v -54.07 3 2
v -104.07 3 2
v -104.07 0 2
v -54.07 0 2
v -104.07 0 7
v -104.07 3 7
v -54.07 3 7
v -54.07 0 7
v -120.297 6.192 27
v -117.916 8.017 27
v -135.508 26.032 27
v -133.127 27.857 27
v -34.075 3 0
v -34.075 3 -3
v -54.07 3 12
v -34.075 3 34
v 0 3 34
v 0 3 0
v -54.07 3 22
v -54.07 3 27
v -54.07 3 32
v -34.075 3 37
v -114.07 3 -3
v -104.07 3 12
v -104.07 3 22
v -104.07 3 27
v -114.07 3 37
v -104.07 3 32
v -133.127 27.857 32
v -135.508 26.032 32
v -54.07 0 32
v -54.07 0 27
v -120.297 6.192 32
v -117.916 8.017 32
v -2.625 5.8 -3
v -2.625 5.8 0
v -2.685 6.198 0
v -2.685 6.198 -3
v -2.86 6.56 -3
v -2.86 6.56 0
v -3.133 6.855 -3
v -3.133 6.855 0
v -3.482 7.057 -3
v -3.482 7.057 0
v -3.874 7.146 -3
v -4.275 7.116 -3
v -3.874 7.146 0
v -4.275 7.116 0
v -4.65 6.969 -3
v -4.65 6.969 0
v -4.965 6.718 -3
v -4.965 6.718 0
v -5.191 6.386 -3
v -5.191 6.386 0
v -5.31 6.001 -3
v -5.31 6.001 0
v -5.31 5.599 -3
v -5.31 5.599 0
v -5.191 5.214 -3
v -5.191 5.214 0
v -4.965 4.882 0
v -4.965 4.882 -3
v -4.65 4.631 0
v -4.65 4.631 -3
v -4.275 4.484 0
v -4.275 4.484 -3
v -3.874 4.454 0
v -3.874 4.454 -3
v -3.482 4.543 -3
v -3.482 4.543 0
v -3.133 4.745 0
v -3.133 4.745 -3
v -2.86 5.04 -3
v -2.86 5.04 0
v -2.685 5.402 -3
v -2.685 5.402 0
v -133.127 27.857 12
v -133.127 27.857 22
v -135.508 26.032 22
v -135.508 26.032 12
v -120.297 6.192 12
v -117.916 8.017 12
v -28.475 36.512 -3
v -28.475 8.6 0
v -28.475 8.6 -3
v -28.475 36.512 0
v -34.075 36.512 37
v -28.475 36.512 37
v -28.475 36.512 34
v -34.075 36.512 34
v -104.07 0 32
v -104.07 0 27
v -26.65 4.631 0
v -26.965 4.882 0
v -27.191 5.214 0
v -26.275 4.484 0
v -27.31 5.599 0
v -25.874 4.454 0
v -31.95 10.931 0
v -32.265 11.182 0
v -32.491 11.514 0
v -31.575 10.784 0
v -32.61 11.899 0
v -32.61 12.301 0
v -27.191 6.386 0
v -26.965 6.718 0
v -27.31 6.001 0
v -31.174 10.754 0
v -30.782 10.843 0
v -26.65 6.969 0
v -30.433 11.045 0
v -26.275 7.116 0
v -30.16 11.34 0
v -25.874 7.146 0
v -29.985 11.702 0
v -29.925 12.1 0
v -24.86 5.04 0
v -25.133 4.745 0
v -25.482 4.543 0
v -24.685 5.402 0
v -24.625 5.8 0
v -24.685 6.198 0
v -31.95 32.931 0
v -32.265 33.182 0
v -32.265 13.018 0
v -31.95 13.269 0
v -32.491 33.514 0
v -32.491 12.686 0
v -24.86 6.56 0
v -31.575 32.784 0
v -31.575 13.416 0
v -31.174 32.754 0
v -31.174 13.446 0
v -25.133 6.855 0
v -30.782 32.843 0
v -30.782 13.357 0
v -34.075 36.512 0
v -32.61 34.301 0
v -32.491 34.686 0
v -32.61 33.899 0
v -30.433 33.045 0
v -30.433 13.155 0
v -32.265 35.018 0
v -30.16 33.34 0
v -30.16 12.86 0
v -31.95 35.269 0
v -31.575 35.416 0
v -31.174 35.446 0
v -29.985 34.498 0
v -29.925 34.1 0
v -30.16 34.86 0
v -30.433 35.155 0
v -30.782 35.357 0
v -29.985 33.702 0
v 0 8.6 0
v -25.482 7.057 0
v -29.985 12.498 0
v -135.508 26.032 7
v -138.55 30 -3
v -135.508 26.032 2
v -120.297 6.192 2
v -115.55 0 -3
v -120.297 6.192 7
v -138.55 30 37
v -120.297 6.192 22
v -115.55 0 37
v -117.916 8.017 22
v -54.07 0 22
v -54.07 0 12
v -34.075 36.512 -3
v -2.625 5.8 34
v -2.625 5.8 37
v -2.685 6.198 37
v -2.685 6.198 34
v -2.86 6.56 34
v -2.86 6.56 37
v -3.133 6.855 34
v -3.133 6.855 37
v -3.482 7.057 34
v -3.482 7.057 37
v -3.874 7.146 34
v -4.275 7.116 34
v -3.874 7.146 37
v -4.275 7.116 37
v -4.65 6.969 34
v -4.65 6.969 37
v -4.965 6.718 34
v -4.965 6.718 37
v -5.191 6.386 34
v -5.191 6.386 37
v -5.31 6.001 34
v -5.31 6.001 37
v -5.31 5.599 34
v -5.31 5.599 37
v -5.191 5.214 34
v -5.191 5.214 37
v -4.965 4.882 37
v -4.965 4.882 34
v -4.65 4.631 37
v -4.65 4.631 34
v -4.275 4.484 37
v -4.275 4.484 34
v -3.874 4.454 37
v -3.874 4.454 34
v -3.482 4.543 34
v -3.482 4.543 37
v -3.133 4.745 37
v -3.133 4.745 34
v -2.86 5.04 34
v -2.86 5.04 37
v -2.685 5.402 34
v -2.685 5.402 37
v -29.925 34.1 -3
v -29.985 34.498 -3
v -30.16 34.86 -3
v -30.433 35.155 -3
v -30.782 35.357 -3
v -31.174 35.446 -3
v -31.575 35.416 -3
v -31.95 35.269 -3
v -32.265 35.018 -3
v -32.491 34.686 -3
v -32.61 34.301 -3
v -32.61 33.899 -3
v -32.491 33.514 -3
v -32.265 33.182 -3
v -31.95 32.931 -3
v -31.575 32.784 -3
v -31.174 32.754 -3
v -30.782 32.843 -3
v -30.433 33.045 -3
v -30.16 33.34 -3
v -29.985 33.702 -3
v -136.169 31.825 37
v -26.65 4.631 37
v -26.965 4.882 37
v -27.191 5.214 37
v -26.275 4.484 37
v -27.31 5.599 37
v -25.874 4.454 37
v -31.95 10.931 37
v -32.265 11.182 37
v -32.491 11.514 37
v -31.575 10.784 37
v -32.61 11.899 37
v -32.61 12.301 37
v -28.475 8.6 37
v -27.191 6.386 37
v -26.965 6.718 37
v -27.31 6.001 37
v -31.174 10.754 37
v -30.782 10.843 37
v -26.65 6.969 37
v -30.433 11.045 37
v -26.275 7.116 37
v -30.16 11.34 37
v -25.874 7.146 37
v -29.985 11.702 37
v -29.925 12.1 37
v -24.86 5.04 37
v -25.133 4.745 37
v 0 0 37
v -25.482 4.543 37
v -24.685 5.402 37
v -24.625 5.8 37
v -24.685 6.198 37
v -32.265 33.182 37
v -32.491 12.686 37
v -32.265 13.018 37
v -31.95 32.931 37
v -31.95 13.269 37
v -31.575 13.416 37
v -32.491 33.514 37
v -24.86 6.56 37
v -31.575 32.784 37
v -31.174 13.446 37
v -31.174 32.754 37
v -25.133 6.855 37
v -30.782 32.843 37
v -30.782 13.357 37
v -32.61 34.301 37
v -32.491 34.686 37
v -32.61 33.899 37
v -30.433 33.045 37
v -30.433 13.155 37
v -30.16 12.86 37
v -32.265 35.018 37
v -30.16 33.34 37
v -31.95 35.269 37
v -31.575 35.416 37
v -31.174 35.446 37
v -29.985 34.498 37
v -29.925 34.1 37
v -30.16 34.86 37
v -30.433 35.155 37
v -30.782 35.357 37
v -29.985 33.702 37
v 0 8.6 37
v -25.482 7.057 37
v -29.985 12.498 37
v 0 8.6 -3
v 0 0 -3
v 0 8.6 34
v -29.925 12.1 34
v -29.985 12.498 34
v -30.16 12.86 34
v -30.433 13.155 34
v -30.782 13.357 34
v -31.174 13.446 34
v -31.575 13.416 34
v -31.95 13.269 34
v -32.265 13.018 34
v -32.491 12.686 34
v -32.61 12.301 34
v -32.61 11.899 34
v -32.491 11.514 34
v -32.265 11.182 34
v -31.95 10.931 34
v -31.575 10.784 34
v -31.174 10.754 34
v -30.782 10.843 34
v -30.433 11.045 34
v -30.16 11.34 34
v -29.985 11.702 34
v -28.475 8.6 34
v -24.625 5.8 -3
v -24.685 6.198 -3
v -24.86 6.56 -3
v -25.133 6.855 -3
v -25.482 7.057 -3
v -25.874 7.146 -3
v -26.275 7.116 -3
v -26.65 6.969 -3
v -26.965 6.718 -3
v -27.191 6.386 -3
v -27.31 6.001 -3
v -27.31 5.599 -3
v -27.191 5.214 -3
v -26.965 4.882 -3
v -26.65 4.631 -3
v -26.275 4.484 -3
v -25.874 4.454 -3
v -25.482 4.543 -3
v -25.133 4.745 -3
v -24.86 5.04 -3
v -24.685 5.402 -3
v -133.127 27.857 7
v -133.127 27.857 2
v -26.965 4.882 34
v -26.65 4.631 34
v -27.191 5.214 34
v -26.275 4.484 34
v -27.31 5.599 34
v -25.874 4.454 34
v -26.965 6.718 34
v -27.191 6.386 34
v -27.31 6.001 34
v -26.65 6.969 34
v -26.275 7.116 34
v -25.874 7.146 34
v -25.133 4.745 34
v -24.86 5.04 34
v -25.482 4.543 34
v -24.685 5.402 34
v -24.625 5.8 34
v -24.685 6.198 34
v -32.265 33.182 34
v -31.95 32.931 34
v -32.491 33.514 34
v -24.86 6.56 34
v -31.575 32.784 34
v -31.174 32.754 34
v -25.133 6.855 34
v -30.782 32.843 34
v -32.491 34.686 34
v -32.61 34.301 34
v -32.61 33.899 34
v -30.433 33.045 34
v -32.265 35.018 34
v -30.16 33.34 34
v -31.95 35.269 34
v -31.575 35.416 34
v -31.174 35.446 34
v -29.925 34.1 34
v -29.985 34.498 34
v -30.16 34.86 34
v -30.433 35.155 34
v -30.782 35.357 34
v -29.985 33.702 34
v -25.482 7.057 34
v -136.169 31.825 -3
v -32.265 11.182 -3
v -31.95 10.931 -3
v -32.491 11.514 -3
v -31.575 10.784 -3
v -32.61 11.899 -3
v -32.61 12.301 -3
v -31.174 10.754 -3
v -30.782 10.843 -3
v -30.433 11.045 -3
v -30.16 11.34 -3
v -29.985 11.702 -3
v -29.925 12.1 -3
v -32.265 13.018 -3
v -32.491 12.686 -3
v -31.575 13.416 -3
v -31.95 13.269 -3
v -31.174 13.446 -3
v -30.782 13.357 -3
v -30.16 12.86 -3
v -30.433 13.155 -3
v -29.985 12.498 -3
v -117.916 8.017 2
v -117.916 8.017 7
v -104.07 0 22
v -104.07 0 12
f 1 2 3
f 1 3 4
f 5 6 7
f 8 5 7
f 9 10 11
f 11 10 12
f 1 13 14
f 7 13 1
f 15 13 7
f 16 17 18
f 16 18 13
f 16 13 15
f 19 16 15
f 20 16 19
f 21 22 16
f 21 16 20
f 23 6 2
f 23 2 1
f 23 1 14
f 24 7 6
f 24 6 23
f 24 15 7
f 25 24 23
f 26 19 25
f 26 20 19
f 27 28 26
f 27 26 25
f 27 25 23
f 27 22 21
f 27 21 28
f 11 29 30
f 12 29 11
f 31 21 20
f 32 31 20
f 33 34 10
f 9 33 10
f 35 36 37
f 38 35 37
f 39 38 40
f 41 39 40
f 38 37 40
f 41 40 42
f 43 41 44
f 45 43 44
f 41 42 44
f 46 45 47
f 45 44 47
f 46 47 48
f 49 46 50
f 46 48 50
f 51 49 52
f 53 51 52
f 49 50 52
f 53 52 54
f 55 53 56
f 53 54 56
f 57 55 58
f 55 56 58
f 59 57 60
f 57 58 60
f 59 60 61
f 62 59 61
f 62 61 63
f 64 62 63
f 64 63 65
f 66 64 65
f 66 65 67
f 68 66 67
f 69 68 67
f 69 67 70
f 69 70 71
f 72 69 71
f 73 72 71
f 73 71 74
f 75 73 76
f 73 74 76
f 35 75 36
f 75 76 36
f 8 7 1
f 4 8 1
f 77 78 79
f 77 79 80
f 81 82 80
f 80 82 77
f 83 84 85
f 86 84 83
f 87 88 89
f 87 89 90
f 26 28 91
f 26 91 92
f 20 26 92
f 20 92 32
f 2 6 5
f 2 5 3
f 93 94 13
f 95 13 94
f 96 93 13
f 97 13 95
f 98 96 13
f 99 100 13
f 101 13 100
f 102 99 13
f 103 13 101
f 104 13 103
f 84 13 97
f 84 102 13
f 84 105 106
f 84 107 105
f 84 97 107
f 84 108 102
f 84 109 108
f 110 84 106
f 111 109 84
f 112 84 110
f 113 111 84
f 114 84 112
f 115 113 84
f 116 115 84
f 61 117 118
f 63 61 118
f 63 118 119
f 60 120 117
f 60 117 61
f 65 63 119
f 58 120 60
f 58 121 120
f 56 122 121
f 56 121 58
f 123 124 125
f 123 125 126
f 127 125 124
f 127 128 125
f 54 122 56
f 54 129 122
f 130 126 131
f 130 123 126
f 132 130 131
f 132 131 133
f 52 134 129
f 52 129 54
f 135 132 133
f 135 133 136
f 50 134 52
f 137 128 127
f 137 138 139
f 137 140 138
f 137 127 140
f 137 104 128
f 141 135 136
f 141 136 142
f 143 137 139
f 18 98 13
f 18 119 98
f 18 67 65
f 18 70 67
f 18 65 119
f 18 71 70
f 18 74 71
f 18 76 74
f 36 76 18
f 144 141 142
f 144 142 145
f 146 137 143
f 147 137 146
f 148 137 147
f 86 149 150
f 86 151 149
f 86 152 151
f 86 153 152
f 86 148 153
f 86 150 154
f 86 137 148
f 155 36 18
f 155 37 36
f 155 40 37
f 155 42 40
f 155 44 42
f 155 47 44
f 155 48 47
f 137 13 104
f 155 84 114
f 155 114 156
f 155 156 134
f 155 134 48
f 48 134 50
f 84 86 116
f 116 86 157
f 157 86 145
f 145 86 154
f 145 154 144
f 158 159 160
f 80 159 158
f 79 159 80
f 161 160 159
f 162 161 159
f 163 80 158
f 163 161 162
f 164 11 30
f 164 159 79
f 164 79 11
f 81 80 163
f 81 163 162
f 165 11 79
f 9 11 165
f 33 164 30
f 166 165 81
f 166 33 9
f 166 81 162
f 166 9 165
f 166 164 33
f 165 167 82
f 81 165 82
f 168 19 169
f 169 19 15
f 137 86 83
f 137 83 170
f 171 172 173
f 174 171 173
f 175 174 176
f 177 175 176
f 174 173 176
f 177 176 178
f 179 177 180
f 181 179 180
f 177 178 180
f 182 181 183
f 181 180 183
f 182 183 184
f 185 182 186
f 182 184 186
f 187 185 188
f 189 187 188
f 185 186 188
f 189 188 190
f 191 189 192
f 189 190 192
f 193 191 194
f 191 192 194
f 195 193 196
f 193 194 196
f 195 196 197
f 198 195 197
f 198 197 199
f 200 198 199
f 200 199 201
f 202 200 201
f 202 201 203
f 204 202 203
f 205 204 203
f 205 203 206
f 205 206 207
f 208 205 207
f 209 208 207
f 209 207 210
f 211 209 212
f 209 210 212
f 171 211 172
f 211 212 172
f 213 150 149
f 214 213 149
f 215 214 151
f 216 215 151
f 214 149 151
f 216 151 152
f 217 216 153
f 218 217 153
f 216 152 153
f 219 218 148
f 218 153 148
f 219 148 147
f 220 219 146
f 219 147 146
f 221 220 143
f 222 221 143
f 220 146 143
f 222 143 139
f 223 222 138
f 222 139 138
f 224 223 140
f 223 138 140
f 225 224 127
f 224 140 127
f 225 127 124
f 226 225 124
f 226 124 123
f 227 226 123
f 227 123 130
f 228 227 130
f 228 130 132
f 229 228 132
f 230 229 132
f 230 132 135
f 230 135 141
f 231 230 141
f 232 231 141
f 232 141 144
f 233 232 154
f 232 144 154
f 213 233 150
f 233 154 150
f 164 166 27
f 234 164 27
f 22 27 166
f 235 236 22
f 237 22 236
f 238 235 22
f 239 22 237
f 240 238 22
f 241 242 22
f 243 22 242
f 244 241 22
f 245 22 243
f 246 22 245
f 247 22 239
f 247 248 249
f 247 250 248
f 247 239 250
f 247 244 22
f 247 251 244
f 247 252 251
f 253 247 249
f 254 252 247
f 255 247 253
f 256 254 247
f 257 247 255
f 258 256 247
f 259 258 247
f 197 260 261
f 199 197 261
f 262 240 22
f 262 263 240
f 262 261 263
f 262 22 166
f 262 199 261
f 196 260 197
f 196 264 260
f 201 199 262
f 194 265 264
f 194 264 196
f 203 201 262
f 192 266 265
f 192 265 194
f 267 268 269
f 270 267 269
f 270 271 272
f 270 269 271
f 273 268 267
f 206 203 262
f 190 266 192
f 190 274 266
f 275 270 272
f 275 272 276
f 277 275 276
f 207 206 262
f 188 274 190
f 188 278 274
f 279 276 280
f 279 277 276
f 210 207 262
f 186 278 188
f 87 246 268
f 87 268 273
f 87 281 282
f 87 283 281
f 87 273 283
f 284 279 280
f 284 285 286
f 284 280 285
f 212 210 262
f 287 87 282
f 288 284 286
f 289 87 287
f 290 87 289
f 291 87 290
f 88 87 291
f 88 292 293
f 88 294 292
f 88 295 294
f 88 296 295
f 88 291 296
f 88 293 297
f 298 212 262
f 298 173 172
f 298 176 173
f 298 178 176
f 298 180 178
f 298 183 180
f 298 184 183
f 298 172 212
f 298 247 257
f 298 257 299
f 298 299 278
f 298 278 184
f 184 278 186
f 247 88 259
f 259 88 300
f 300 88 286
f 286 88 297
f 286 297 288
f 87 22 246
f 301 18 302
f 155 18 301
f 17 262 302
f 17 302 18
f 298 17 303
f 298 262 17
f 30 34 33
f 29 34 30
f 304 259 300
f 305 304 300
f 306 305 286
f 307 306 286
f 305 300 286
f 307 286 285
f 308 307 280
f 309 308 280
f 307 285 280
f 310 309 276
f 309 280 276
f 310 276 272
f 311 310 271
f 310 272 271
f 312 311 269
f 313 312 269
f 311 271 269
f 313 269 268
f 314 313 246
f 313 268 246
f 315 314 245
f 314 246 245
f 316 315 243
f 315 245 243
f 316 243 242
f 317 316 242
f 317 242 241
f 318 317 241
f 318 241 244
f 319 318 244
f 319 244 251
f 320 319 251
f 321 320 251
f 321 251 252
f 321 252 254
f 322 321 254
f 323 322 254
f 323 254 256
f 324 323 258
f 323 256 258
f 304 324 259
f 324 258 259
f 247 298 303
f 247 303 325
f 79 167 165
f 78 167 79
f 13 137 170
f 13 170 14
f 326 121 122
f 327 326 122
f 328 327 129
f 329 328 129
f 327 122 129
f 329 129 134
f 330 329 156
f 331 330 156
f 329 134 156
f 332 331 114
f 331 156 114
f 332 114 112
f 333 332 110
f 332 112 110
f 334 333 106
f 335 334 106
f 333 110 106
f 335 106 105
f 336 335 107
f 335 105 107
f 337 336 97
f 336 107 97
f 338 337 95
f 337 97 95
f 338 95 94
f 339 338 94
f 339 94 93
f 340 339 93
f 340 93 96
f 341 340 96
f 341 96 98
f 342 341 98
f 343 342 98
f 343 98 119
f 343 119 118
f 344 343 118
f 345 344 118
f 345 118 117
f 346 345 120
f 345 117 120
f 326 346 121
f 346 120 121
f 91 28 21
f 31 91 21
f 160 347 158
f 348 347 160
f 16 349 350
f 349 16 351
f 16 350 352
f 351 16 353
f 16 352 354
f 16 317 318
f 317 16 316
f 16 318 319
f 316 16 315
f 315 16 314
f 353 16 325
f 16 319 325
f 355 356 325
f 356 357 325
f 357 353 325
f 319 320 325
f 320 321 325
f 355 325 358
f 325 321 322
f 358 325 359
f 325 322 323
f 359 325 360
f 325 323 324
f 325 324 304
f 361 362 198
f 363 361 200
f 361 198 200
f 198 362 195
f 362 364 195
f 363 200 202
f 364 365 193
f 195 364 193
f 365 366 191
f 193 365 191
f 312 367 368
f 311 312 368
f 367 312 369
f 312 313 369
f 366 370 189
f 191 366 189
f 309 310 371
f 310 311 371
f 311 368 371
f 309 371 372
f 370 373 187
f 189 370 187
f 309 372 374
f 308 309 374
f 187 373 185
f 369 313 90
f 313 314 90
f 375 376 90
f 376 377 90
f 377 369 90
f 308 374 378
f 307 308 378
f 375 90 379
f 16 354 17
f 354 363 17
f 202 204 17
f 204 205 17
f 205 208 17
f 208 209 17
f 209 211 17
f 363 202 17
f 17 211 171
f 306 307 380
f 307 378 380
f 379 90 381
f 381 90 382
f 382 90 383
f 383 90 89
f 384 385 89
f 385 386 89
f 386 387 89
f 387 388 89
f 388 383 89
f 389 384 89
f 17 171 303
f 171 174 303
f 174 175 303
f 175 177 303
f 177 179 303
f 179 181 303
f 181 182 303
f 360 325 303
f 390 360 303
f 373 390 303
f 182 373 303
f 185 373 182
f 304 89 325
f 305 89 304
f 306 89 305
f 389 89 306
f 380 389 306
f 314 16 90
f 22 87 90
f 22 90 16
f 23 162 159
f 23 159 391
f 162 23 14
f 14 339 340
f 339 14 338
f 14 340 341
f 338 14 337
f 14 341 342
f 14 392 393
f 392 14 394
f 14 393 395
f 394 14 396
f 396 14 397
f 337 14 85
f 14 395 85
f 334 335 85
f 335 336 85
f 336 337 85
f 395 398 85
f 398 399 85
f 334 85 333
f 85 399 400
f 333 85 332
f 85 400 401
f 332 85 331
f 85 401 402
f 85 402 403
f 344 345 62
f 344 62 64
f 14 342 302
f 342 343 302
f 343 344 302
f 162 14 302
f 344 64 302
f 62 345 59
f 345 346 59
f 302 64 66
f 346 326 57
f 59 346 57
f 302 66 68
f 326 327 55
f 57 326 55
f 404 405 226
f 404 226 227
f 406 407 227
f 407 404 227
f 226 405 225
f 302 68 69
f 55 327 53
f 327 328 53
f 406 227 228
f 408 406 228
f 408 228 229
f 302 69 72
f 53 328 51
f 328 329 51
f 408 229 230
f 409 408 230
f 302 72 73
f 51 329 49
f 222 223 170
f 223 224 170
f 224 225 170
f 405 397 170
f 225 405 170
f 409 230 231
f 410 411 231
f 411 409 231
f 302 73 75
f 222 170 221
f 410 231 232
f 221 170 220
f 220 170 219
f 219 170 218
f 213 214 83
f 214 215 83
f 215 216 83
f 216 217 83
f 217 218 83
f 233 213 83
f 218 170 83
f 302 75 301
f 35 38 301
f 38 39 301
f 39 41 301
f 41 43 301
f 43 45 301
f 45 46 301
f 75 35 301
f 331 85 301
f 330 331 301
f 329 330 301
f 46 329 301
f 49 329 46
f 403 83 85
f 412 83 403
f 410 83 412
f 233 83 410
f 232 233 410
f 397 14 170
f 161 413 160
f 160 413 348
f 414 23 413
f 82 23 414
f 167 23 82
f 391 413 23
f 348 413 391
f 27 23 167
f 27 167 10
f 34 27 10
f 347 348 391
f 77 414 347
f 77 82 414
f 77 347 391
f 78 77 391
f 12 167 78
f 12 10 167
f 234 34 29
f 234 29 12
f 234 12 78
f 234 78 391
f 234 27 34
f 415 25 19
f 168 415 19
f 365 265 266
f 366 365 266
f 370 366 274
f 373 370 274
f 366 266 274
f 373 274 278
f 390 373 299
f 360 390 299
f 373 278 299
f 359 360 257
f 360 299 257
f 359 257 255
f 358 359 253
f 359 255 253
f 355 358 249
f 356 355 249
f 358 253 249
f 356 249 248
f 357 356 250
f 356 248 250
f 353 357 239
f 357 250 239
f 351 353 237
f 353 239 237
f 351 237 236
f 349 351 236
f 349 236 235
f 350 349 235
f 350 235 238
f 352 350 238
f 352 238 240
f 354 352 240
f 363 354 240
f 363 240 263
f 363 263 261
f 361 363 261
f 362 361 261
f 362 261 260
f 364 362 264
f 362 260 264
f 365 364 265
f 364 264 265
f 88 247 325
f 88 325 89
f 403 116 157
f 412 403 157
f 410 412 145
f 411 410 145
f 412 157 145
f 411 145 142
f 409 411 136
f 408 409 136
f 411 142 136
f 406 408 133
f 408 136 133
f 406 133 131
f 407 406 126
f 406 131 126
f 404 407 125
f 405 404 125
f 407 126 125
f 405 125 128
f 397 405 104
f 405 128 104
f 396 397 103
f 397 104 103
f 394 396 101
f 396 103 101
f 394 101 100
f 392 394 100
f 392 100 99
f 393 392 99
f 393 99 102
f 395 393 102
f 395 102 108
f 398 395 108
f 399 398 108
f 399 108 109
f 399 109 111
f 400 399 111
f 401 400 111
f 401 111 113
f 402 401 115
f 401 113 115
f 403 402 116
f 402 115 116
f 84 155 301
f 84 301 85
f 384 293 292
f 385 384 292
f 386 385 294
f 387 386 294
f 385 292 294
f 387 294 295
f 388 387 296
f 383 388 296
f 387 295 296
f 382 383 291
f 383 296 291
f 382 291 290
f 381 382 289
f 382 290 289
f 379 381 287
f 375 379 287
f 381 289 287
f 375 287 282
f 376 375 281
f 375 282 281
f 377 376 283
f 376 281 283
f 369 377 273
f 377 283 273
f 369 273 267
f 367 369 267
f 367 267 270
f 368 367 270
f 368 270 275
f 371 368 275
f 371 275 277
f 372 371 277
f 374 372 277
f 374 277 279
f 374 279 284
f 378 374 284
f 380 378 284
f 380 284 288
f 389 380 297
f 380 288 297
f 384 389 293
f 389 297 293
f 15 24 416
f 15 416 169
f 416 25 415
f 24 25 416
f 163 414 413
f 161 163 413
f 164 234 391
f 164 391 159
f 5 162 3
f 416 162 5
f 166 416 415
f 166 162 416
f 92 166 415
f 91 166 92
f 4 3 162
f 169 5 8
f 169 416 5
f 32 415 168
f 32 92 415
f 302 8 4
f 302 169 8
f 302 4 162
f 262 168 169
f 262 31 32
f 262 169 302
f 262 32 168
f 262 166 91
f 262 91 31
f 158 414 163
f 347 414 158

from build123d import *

# Parameters (mm, degrees)
BOSS_EXTRUDE1_DEPTH = 34
BOSS_EXTRUDE4_START = -34
SKETCH2_R           = 1.35
BOSS_EXTRUDE4_DEPTH = 3
BOSS_EXTRUDE5_START = 3
SKETCH3_R           = 1.35
BOSS_EXTRUDE5_DEPTH = 3
CUT_EXTRUDE1_REACH  = 149.269
SKETCH4_W           = 50
SKETCH4_H           = 5
SKETCH4_H_2         = 10
CUT_EXTRUDE3_REACH  = 122.462
SKETCH5_W           = 5
SKETCH5_H           = 25


with BuildPart() as part:
    # Sketch1 → Boss-Extrude1 (new body)
    with BuildSketch(Plane.XY):
        Polygon((-115.55, 0), (0, 0), (0, 3), (-114.069788366, 3), (-136.169180916, 31.825294631), (-138.55, 30), align=None)
    extrude(amount=BOSS_EXTRUDE1_DEPTH)

    # Sketch2 → Boss-Extrude4 (add)
    # profile 1 of 3: a face of its own
    with BuildSketch(Plane.XY.offset(34).offset(BOSS_EXTRUDE4_START)):
        Polygon((0, 3), (-114.069788366, 3), (-136.169180916, 31.825294631), (-138.55, 30), (-115.55, 0), (0, 0), align=None)
    # profile 2 of 3: a face of its own
    with BuildSketch(Plane.XY.offset(34).offset(BOSS_EXTRUDE4_START)):
        Polygon((-34.075, 36.51210805), (-34.075, 3), (0, 3), (0, 8.6), (-28.475, 8.6), (-28.475, 36.51210805), align=None)
        with Locations((-25.975, 5.8)):
            Circle(SKETCH2_R, mode=Mode.SUBTRACT)
        with Locations((-3.975, 5.8)):
            Circle(SKETCH2_R, mode=Mode.SUBTRACT)
        with Locations((-31.275, 12.1)):
            Circle(SKETCH2_R, mode=Mode.SUBTRACT)
        with Locations((-31.275, 34.1)):
            Circle(SKETCH2_R, mode=Mode.SUBTRACT)
    # profile 3 of 3: a face of its own
    with BuildSketch(Plane.XY.offset(34).offset(BOSS_EXTRUDE4_START)):
        Polygon((-104.069788366, 3), (-114.069788366, 3), (-136.169180916, 31.825294631), (-138.55, 30), (-115.55, 0), (0, 0), (0, 3), (-34.075, 3), (-100.504119084, 3), align=None)
    extrude(amount=-BOSS_EXTRUDE4_DEPTH)

    # Sketch3 → Boss-Extrude5 (add)
    with BuildSketch(Plane.XY.offset(34).offset(BOSS_EXTRUDE5_START)):
        Polygon((0, 0), (0, 3), (0, 8.6), (-28.475, 8.6), (-28.475, 36.51210805), (-34.075, 36.51210805), (-34.075, 3), (-114.069788366, 3), (-136.169180916, 31.825294631), (-138.55, 30), (-115.55, 0), align=None)
        with Locations((-31.275, 34.1)):
            Circle(SKETCH3_R, mode=Mode.SUBTRACT)
        with Locations((-31.275, 12.1)):
            Circle(SKETCH3_R, mode=Mode.SUBTRACT)
        with Locations((-25.975, 5.8)):
            Circle(SKETCH3_R, mode=Mode.SUBTRACT)
        with Locations((-3.975, 5.8)):
            Circle(SKETCH3_R, mode=Mode.SUBTRACT)
    extrude(amount=-BOSS_EXTRUDE5_DEPTH)

    # Sketch4 → Cut-Extrude1 (cut, up to next)
    with BuildSketch(Plane(origin=(0, 3, 0), x_dir=(1, 0, 0), z_dir=(0, 1, 0)), mode=Mode.PRIVATE) as cut_extrude1_sk1:
        with Locations((-79.069788366, -4.5)):
            Rectangle(SKETCH4_W, SKETCH4_H)
    cut_extrude1_tool1 = extrude(cut_extrude1_sk1.sketch, amount=-CUT_EXTRUDE1_REACH, mode=Mode.PRIVATE) & part.part
    # Sketch4 → Cut-Extrude1 (cut, up to next)
    with BuildSketch(Plane(origin=(0, 3, 0), x_dir=(1, 0, 0), z_dir=(0, 1, 0)), mode=Mode.PRIVATE) as cut_extrude1_sk2:
        with Locations((-79.069788366, -29.5)):
            Rectangle(SKETCH4_W, SKETCH4_H)
    cut_extrude1_tool2 = extrude(cut_extrude1_sk2.sketch, amount=-CUT_EXTRUDE1_REACH, mode=Mode.PRIVATE) & part.part
    # Sketch4 → Cut-Extrude1 (cut, up to next)
    with BuildSketch(Plane(origin=(0, 3, 0), x_dir=(1, 0, 0), z_dir=(0, 1, 0)), mode=Mode.PRIVATE) as cut_extrude1_sk3:
        with Locations((-79.069788366, -17)):
            Rectangle(SKETCH4_W, SKETCH4_H_2)
    cut_extrude1_tool3 = extrude(cut_extrude1_sk3.sketch, amount=-CUT_EXTRUDE1_REACH, mode=Mode.PRIVATE) & part.part
    add(cut_extrude1_tool1.solids().sort_by_distance((-79.069788, 3, 4.5))[0], mode=Mode.SUBTRACT)
    add(cut_extrude1_tool2.solids().sort_by_distance((-79.069788, 3, 29.5))[0], mode=Mode.SUBTRACT)
    add(cut_extrude1_tool3.solids().sort_by_distance((-79.069788, 3, 17))[0], mode=Mode.SUBTRACT)

    # Sketch5 → Cut-Extrude3 (cut, up to next)
    with BuildSketch(Plane(origin=(-70.393848516, -53.968617195, 0), x_dir=(0, 0, -1), z_dir=(0.7936063612919156, 0.6084315436571361, 0)), mode=Mode.PRIVATE) as cut_extrude3_sk1:
        with Locations((-19.5, 90.606381212)):
            Rectangle(SKETCH5_W, SKETCH5_H)
    cut_extrude3_tool1 = extrude(cut_extrude3_sk1.sketch, amount=-CUT_EXTRUDE3_REACH, mode=Mode.PRIVATE) & part.part
    # Sketch5 → Cut-Extrude3 (cut, up to next)
    with BuildSketch(Plane(origin=(-70.393848516, -53.968617195, 0), x_dir=(0, 0, -1), z_dir=(0.7936063612919156, 0.6084315436571361, 0)), mode=Mode.PRIVATE) as cut_extrude3_sk2:
        with Locations((-14.5, 90.606381212)):
            Rectangle(SKETCH5_W, SKETCH5_H)
    cut_extrude3_tool2 = extrude(cut_extrude3_sk2.sketch, amount=-CUT_EXTRUDE3_REACH, mode=Mode.PRIVATE) & part.part
    # Sketch5 → Cut-Extrude3 (cut, up to next)
    with BuildSketch(Plane(origin=(-70.393848516, -53.968617195, 0), x_dir=(0, 0, -1), z_dir=(0.7936063612919156, 0.6084315436571361, 0)), mode=Mode.PRIVATE) as cut_extrude3_sk3:
        with Locations((-4.5, 90.606381212)):
            Rectangle(SKETCH5_W, SKETCH5_H)
    cut_extrude3_tool3 = extrude(cut_extrude3_sk3.sketch, amount=-CUT_EXTRUDE3_REACH, mode=Mode.PRIVATE) & part.part
    # Sketch5 → Cut-Extrude3 (cut, up to next)
    with BuildSketch(Plane(origin=(-70.393848516, -53.968617195, 0), x_dir=(0, 0, -1), z_dir=(0.7936063612919156, 0.6084315436571361, 0)), mode=Mode.PRIVATE) as cut_extrude3_sk4:
        with Locations((-29.5, 90.606381212)):
            Rectangle(SKETCH5_W, SKETCH5_H)
    cut_extrude3_tool4 = extrude(cut_extrude3_sk4.sketch, amount=-CUT_EXTRUDE3_REACH, mode=Mode.PRIVATE) & part.part
    add(cut_extrude3_tool1.solids().sort_by_distance((-125.521629, 17.937183, 19.5))[0], mode=Mode.SUBTRACT)
    add(cut_extrude3_tool2.solids().sort_by_distance((-125.521629, 17.937183, 14.5))[0], mode=Mode.SUBTRACT)
    add(cut_extrude3_tool3.solids().sort_by_distance((-125.521629, 17.937183, 4.5))[0], mode=Mode.SUBTRACT)
    add(cut_extrude3_tool4.solids().sort_by_distance((-125.521629, 17.937183, 29.5))[0], mode=Mode.SUBTRACT)


solid = part.part
